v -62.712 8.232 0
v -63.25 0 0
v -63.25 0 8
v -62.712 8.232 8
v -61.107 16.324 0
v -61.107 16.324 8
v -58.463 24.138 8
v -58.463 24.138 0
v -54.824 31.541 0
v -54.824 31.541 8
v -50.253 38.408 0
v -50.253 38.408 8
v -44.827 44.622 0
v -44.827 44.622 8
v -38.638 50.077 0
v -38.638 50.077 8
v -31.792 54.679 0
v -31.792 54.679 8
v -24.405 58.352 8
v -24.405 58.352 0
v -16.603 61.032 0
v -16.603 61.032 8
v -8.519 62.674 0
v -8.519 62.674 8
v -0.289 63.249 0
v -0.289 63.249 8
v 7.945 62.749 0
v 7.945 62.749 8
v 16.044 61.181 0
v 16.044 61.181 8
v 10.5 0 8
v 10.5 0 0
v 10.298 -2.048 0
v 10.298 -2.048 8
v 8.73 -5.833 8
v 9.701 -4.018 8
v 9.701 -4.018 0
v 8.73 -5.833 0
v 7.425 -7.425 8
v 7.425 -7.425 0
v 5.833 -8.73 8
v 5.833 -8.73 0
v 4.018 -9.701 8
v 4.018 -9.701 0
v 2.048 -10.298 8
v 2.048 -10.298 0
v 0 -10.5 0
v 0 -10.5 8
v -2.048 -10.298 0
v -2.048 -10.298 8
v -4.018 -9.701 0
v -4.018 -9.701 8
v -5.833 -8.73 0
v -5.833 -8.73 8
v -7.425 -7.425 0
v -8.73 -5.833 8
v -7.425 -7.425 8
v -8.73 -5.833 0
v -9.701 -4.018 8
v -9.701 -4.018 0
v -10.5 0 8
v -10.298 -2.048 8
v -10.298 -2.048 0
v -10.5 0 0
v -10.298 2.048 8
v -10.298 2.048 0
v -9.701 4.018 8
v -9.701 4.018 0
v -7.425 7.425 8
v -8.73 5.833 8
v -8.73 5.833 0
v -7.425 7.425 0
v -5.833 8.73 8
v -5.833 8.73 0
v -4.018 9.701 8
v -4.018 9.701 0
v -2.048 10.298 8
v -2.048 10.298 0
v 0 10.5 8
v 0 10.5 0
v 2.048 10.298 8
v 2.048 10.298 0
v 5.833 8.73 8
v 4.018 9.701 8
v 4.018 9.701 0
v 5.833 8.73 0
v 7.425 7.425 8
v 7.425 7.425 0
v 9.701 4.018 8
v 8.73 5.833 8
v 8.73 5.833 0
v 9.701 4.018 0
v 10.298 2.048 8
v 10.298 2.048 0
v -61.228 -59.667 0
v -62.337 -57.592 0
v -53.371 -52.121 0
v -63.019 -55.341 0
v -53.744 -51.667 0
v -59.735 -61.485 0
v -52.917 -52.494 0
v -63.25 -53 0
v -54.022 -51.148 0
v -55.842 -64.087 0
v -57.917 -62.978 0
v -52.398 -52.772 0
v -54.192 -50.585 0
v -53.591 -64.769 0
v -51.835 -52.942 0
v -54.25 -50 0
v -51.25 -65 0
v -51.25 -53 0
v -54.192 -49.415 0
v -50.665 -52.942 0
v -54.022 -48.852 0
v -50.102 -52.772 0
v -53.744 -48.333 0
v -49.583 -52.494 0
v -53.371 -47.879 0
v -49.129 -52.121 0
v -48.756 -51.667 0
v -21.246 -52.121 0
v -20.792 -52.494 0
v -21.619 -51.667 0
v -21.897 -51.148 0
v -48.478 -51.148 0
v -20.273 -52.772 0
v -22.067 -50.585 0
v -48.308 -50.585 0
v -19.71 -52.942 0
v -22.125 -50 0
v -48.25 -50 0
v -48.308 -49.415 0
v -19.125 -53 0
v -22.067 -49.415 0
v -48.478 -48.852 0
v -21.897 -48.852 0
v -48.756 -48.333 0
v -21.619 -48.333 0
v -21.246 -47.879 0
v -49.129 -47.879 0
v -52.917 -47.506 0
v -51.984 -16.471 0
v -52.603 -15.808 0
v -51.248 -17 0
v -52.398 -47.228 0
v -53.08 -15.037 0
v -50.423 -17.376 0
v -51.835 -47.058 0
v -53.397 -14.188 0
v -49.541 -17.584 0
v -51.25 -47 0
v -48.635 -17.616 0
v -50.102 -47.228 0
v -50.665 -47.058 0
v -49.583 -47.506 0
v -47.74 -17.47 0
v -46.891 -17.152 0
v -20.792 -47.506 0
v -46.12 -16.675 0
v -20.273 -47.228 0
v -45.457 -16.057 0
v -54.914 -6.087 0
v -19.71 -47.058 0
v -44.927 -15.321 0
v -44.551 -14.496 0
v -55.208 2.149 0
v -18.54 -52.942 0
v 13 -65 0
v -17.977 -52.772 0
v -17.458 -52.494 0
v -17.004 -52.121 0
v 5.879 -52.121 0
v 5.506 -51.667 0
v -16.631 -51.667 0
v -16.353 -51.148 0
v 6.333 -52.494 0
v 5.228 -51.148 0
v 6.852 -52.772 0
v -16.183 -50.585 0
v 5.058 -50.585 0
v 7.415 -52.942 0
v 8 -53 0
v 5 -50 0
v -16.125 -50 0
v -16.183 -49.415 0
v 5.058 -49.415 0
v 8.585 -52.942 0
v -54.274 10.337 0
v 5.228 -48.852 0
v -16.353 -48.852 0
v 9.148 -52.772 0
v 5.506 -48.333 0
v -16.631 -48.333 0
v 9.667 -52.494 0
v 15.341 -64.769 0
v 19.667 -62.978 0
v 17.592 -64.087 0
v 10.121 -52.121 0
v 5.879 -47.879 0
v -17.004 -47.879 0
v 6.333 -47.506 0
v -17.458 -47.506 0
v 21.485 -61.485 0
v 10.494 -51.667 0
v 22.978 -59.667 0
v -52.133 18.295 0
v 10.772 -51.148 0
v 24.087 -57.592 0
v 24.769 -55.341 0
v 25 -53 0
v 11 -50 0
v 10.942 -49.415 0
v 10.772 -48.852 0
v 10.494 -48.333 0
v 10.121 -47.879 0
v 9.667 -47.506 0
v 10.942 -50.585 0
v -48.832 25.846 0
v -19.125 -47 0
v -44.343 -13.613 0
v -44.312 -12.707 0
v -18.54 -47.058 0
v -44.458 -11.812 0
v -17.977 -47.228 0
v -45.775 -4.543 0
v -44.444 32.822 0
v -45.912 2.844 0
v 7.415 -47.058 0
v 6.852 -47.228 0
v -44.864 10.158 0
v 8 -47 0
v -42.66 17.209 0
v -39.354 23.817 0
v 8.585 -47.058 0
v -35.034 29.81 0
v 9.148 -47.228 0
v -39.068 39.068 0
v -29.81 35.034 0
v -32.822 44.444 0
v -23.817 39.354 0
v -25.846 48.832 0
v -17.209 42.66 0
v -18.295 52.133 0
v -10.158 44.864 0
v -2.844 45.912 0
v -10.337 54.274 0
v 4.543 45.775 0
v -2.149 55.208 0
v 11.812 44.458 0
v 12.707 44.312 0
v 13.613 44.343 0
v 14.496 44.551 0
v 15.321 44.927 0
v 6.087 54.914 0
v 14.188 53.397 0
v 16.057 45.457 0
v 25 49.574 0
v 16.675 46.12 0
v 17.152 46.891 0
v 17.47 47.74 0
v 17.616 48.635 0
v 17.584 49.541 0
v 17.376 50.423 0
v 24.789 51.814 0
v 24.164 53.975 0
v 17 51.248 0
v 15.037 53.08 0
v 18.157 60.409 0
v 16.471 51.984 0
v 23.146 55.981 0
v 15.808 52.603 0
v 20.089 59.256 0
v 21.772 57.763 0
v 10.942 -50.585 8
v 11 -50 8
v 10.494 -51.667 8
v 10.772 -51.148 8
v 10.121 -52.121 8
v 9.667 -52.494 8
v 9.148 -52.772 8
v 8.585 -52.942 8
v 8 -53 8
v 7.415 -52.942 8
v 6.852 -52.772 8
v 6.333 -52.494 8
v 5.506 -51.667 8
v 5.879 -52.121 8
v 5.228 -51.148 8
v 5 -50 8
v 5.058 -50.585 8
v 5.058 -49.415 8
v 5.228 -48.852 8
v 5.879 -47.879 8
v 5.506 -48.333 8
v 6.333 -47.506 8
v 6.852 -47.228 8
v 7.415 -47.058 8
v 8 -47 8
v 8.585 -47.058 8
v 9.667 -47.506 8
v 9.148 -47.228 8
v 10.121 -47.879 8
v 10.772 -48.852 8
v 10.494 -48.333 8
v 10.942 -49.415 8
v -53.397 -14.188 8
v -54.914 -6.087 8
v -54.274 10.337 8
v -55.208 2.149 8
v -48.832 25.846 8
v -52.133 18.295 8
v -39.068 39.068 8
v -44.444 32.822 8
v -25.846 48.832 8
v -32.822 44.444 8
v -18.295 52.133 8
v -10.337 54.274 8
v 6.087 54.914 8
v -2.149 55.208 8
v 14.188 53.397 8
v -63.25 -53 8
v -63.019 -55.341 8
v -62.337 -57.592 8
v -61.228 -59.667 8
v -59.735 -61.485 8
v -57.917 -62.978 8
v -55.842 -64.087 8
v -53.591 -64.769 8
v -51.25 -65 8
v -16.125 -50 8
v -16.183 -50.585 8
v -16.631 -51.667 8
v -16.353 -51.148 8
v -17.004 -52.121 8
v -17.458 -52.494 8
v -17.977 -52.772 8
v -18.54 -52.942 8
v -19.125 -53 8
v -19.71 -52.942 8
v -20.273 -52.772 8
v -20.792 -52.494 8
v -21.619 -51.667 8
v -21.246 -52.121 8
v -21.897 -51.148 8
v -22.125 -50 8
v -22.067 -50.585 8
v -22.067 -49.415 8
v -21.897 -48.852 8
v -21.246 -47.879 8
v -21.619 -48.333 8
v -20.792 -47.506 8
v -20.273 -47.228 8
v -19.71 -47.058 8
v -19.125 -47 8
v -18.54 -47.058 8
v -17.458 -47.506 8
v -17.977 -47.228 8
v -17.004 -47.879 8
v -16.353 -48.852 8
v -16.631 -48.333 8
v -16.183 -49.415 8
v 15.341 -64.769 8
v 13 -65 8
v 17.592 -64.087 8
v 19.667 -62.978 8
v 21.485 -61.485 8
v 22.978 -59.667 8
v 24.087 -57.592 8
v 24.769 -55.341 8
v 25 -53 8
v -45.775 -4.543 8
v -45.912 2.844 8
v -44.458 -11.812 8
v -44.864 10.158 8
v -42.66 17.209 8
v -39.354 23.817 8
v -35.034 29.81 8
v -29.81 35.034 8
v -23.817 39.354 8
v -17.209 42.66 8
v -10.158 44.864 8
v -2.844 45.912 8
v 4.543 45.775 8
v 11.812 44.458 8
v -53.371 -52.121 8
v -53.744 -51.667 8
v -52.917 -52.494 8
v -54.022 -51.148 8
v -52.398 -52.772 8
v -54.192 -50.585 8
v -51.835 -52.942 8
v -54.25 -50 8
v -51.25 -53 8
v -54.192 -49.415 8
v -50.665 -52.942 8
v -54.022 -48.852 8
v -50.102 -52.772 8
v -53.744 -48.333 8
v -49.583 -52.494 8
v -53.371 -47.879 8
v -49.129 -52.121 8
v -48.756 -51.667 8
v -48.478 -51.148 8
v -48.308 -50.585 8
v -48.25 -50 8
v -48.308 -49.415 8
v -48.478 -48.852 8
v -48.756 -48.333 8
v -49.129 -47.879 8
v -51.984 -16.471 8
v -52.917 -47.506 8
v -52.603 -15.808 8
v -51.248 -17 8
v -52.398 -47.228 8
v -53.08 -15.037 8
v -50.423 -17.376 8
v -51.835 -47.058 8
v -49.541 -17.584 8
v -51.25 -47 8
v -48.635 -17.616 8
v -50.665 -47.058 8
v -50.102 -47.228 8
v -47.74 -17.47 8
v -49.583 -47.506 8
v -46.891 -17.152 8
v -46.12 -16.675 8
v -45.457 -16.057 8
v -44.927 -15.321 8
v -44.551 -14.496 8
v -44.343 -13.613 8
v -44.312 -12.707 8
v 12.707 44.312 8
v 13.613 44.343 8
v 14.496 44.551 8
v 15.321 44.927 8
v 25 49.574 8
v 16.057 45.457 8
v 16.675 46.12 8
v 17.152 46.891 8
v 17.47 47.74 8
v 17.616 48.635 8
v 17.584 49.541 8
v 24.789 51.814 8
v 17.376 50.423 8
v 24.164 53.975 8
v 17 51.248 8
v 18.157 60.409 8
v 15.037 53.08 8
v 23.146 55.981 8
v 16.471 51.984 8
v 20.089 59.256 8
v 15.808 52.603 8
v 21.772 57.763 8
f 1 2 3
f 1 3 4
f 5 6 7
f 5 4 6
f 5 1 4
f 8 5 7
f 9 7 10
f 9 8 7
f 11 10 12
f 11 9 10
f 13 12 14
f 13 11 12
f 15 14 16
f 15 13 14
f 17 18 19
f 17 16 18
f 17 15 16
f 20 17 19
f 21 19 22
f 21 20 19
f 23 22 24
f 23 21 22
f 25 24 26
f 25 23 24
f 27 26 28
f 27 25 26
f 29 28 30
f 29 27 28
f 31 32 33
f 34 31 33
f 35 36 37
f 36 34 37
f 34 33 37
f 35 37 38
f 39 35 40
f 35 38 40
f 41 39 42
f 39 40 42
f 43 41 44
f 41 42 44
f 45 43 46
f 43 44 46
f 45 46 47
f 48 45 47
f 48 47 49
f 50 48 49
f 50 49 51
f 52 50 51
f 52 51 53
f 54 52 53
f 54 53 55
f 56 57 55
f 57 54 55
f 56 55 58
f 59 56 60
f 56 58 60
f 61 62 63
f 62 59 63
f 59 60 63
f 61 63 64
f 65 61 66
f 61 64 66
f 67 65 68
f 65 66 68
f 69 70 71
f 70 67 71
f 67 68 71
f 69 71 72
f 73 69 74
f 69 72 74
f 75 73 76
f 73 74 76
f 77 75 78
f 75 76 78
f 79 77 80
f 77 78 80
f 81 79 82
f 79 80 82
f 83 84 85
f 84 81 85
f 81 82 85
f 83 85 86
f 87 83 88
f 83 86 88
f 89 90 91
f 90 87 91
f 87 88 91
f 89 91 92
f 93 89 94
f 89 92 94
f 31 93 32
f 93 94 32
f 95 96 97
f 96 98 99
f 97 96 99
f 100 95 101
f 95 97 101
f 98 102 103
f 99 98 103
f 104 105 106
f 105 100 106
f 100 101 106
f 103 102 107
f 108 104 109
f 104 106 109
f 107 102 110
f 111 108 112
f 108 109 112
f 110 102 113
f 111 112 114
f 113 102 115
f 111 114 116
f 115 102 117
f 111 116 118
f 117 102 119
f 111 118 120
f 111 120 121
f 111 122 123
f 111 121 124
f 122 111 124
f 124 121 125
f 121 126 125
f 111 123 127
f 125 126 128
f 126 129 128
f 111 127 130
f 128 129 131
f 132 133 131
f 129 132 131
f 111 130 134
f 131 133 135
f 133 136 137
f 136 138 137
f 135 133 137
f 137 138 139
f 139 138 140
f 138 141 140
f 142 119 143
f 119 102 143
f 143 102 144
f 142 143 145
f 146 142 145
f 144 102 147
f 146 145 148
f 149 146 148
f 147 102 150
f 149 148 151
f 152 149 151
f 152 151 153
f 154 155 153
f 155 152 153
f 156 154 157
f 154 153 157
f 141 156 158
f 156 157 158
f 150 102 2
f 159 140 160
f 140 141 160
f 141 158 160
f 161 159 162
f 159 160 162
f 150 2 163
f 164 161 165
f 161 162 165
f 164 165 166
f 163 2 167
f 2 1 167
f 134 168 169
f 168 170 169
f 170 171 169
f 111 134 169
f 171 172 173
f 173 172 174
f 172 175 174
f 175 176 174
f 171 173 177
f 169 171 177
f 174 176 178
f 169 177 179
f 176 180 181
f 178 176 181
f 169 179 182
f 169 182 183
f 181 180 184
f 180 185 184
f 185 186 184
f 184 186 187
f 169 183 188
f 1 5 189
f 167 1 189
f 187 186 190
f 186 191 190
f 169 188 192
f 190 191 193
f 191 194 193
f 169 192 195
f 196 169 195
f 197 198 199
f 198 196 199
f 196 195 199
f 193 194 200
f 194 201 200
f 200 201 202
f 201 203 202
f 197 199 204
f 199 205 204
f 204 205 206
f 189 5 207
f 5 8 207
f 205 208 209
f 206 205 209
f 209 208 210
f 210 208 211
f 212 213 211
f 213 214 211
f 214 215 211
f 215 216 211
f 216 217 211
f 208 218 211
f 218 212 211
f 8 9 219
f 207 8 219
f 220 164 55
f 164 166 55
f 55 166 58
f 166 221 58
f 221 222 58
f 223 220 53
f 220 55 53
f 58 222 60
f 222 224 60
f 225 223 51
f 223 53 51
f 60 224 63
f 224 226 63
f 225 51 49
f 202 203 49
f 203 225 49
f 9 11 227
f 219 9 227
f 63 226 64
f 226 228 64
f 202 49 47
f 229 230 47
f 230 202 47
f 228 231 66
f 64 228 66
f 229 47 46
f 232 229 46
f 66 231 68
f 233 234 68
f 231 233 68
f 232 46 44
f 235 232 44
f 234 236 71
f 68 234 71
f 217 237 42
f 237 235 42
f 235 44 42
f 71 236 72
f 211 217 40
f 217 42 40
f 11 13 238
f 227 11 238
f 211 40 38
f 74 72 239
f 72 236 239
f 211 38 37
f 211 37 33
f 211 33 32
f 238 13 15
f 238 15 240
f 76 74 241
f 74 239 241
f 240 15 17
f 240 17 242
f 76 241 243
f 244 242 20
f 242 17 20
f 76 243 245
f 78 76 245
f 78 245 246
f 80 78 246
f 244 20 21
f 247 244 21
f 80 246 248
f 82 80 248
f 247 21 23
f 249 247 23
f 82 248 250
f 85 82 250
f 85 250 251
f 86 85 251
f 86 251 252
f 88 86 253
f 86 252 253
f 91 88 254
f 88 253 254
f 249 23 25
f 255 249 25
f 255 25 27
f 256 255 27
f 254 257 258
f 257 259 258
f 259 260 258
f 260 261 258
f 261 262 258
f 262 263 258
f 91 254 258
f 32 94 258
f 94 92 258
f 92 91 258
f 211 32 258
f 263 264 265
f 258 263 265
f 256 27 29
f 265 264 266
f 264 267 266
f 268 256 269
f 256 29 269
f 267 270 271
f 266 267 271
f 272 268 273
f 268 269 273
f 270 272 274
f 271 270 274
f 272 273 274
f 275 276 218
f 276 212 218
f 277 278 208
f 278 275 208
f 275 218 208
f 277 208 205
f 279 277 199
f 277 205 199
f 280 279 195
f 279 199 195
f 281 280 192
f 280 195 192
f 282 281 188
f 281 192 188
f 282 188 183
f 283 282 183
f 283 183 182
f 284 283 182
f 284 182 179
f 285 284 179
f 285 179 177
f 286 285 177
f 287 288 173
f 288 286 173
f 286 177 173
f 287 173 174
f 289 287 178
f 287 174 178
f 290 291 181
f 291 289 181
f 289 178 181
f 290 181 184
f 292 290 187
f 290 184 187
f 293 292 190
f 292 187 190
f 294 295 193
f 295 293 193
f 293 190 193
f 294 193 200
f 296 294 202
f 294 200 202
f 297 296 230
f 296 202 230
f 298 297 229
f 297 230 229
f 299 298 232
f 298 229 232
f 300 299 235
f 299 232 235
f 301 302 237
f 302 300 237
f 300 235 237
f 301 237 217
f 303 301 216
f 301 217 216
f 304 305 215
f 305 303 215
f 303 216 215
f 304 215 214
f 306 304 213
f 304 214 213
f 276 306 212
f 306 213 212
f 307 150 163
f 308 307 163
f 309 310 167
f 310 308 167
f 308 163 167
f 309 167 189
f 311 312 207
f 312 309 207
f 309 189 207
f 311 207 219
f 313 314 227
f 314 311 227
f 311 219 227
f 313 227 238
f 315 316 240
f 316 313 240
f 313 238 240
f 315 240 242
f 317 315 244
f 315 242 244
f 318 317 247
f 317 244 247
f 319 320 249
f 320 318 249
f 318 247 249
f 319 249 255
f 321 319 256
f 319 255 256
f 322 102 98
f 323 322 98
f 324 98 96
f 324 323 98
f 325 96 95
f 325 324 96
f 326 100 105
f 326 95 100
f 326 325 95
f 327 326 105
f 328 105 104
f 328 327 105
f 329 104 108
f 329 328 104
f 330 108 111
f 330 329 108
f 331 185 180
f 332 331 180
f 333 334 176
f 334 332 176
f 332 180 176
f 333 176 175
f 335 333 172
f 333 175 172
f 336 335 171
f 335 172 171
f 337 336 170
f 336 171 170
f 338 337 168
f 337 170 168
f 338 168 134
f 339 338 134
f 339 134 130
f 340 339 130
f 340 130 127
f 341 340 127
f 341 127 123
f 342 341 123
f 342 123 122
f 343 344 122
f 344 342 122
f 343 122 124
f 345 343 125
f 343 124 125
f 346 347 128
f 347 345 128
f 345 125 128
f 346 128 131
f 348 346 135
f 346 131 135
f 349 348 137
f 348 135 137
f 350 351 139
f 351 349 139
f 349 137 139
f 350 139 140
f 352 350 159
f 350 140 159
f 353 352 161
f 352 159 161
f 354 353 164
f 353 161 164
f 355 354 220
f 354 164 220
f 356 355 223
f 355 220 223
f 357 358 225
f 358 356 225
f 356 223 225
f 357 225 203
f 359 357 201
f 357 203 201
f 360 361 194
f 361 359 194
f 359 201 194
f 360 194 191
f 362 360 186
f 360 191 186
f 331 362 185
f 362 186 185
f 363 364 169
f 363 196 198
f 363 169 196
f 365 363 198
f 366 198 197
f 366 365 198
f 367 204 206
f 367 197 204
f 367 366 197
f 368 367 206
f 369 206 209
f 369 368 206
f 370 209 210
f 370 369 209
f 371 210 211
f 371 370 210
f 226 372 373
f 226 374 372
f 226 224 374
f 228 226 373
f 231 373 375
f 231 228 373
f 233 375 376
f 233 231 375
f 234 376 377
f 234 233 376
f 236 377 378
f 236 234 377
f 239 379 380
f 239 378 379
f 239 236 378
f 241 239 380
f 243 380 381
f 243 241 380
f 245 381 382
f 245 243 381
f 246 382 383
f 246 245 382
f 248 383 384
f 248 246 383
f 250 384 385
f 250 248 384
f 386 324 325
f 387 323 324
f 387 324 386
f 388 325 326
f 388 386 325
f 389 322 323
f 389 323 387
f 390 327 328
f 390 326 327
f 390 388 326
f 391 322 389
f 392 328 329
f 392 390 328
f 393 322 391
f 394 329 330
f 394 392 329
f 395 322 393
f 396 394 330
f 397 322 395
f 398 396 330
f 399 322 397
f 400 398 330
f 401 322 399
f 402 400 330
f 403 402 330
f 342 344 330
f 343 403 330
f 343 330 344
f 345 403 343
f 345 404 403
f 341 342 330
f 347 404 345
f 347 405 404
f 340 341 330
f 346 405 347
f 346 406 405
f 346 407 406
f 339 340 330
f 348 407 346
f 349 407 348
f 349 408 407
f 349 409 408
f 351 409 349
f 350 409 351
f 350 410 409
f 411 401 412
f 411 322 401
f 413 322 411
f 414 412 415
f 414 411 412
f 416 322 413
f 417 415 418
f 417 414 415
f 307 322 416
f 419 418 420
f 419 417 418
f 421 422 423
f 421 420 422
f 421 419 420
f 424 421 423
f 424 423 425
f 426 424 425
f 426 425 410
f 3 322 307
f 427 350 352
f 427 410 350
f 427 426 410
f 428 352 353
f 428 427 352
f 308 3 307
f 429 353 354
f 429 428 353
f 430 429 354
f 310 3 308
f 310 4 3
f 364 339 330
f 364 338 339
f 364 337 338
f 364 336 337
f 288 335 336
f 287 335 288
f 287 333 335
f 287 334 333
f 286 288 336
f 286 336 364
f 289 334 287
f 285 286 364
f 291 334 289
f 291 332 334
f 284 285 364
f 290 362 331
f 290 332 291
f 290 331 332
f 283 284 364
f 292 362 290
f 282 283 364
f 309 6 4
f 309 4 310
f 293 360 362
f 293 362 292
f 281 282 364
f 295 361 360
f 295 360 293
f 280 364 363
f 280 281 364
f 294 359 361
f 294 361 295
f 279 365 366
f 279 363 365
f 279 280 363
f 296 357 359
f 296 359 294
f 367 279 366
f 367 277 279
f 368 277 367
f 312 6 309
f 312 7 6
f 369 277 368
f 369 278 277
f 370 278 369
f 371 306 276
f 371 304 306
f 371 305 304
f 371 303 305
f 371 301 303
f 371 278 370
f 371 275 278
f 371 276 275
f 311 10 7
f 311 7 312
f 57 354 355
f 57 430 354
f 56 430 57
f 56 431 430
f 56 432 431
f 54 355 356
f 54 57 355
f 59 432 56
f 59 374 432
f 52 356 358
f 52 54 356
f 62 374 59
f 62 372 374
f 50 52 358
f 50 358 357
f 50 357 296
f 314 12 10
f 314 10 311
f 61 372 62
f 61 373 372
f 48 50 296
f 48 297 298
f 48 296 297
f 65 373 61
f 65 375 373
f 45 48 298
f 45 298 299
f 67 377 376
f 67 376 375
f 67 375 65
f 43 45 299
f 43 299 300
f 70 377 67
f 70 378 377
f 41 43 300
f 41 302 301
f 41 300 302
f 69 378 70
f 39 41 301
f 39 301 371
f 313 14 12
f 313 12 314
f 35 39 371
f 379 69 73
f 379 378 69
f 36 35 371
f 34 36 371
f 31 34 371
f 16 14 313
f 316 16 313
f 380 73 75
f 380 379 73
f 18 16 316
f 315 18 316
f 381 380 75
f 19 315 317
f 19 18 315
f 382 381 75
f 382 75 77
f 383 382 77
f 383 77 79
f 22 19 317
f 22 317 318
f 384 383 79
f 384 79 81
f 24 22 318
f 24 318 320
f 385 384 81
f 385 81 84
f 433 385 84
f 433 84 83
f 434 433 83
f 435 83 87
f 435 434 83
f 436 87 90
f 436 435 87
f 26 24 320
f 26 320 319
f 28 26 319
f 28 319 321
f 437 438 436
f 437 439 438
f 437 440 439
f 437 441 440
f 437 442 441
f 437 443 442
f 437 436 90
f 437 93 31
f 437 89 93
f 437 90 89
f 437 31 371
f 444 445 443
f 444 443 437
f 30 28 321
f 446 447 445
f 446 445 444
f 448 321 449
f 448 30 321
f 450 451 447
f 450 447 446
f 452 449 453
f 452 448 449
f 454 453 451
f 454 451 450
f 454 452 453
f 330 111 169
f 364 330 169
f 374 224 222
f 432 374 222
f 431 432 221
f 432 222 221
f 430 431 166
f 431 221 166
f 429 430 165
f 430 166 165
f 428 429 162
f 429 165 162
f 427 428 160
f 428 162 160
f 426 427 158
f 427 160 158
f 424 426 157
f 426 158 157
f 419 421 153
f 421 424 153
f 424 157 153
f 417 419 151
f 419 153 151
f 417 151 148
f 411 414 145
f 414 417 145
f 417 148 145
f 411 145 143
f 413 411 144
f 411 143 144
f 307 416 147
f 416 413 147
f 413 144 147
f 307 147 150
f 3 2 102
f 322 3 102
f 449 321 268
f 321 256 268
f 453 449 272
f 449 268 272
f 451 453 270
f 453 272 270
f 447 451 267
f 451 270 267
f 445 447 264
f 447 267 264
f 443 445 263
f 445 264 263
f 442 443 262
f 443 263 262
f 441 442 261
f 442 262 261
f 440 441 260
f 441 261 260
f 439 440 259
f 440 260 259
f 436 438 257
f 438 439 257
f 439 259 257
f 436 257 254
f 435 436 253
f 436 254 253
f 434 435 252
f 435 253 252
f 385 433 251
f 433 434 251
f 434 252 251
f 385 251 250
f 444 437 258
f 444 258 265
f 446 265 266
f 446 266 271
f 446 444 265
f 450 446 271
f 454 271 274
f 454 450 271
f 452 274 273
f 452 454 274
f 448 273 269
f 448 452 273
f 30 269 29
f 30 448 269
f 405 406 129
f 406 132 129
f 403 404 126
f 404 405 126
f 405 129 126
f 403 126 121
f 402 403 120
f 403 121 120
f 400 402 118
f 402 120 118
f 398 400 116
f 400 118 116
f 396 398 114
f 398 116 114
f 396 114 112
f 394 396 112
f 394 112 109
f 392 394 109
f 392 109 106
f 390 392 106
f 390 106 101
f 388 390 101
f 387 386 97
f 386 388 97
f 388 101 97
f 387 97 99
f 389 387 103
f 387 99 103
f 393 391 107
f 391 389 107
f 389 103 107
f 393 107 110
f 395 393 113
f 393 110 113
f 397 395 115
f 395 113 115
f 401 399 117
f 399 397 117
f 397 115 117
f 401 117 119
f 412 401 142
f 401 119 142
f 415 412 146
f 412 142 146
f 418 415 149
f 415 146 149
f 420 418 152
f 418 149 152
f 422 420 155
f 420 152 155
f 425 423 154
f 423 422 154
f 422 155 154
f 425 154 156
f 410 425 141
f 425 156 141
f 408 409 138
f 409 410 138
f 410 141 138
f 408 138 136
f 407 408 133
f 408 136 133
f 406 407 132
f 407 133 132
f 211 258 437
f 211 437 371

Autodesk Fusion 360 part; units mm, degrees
sketch "Sketch1" plane through (0, 0, 0) normal (0, 0, 1) x (1, 0, 0)
  circle A0 centre (0, 0) radius 10.5
  circle A1 centre (0, 0) radius 4
  arc A2 (11.8123, 44.4575) -> (-44.4575, -11.8123) centre (0, 0) ccw
  arc A3 (14.1876, 53.3973) -> (-53.3973, -14.1876) centre (0, 0) ccw
  arc A4 (-53.3973, -14.1876) -> (-44.4575, -11.8123) centre (-48.9274, -13) ccw
  arc A5 (11.8123, 44.4575) -> (14.1876, 53.3973) centre (13, 48.9274) ccw
  line L0 (25, 58.0996) -> (25, -65)
  line L1 (-63.25, -65) -> (25, -65)
  line L2 (-63.25, 0) -> (-63.25, -65)
  arc A6 (25, 58.0996) -> (-63.25, 0) centre (0, 0) ccw
  circle A7 centre (-51.25, -50) radius 3
  circle A8 centre (-19.125, -50) radius 3
  circle A9 centre (8, -50) radius 3
  dimension "d1" = 21
  dimension "d2" = 8
  dimension "d3" = 92
  dimension "d4" = 110.5
  dimension "d5" = 9.25
  dimension "d6" = 9.25
  dimension "d9" = 126.5
  dimension "d10" = 25
  dimension "d11" = 12
  dimension "d13" = 6
  dimension "d14" = 6
  dimension "d15" = 6
  dimension "d16" = 15
  dimension "d18" = 15
  dimension "d19" = 15
  dimension "d21" = 12
  dimension "d22" = 17
  dimension "d29" = 65
  dimension "d30" = 50.625
  dimension "d33" = 44.125
  dimension "d34" = 13
extrude "Extrude1" add sketch "Sketch1" along normal blind 8 contours L0 L1 L2 A6
fillet "Fillet1" radius 12 3 edges at (-63.25, -65, 4) (25, -65, 4) (25, 58.0996, 4)
equation "d4 = d3 + 18.5 mm"
equation "d5 = d6"
equation "d6 = ( d4 - d3 ) / 2"
equation "d9 = d4 + 16 mm"
equation "d18 = d16"
equation "d19 = d16"
equation "d21 = d11"
equation "d22 = d11 + 5 mm"
equation "d33 = ( ( d9 / 2 ) + d10 ) / 2"
equation "d34 = d10 - d11"
